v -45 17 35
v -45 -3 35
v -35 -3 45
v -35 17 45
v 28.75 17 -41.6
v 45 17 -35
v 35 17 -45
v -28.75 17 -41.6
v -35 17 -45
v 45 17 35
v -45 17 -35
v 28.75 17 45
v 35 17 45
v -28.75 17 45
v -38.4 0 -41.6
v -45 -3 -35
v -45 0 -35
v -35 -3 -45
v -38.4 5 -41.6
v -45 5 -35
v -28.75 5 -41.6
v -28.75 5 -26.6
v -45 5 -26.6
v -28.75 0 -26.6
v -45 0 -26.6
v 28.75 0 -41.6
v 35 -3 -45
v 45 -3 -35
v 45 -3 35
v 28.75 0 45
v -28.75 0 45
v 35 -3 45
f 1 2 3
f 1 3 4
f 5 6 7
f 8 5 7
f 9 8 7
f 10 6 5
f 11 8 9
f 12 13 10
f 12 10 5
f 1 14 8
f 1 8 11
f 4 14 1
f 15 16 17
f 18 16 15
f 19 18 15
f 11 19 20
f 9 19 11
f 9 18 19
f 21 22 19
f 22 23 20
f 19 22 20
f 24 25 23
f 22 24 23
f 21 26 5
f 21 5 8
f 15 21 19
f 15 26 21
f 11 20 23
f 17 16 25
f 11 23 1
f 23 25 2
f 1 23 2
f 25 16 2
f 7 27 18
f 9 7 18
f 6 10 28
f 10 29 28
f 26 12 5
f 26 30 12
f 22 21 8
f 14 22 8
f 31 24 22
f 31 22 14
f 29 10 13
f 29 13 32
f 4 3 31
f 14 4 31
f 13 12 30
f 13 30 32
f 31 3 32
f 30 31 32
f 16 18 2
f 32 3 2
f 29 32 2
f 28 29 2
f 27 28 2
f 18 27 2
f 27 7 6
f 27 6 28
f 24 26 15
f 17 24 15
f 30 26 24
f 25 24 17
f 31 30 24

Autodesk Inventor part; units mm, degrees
ref_plane "YZ Plane" through (0, 0, 0) normal (1, 0, 0) x (0, 1, 0)
ref_plane "XZ Plane" through (0, 0, 0) normal (0, 1, 0) x (-1, 0, 0)
ref_plane "XY Plane" through (0, 0, 0) normal (0, 0, 1) x (1, 0, 0)
sketch "Sketch1" plane through (0, 0, 0) normal (0, 1, 0) x (-1, 0, 0)
  line L0 (28.75, 45) -> (-28.75, 45) construction
  line L1 (-28.75, 45) -> (-28.75, -41.6)
  line L2 (-28.75, -41.6) -> (28.75, -41.6)
  line L3 (28.75, -41.6) -> (28.75, 45)
  line L4 (28.75, 45) -> (-28.75, -41.6) construction
  line L5 (-28.75, 45) -> (28.75, -41.6) construction
  line L6 (45, 45) -> (-45, 45)
  line L7 (-45, 45) -> (-45, -45)
  line L8 (-45, -45) -> (45, -45)
  line L9 (45, -45) -> (45, 45)
  line L10 (45, 45) -> (-45, -45) construction
  line L11 (-45, 45) -> (45, -45) construction
  point P0 (0, 0)
  point P1 (0, 1.7)
  point P2 (28.75, 45)
  dimension "d0" = 57.5
  dimension "d1" = 86.6
  dimension "d2" = 90
  dimension "d3" = 90
  dimension "d4" = 0
  dimension "d5" = 0
extrude "Extrusion1" add sketch "Sketch1" against normal blind 3
extrude "Extrusion2" add sketch "Sketch1" along normal blind 17 contours L1 L2 L3 L6 L9 L8 L7
chamfer "Chamfer1" distance 10 angle 45 4 edges at (-45, 7, 45) (-45, 7, -45) (45, 7, -45) (45, 7, 45)
sketch "Sketch2" plane through (-45, -3, -35) normal (-1, 0, 0) x (0, 0, 1)
  line L0 (-6.6, 3) -> (-6.6, 20) projected
  line L1 (-6.6, 3) -> (8.4, 3)
  line L2 (8.4, 3) -> (8.4, 8)
  line L3 (8.4, 8) -> (-6.6, 8)
  line L4 (-6.6, 8) -> (-6.6, 3)
  point P0 (35, 3)
  dimension "d13" = 15
  dimension "d14" = 5
extrude "Extrusion3" cut sketch "Sketch2" against normal blind 16.75
properties part number "console case"
